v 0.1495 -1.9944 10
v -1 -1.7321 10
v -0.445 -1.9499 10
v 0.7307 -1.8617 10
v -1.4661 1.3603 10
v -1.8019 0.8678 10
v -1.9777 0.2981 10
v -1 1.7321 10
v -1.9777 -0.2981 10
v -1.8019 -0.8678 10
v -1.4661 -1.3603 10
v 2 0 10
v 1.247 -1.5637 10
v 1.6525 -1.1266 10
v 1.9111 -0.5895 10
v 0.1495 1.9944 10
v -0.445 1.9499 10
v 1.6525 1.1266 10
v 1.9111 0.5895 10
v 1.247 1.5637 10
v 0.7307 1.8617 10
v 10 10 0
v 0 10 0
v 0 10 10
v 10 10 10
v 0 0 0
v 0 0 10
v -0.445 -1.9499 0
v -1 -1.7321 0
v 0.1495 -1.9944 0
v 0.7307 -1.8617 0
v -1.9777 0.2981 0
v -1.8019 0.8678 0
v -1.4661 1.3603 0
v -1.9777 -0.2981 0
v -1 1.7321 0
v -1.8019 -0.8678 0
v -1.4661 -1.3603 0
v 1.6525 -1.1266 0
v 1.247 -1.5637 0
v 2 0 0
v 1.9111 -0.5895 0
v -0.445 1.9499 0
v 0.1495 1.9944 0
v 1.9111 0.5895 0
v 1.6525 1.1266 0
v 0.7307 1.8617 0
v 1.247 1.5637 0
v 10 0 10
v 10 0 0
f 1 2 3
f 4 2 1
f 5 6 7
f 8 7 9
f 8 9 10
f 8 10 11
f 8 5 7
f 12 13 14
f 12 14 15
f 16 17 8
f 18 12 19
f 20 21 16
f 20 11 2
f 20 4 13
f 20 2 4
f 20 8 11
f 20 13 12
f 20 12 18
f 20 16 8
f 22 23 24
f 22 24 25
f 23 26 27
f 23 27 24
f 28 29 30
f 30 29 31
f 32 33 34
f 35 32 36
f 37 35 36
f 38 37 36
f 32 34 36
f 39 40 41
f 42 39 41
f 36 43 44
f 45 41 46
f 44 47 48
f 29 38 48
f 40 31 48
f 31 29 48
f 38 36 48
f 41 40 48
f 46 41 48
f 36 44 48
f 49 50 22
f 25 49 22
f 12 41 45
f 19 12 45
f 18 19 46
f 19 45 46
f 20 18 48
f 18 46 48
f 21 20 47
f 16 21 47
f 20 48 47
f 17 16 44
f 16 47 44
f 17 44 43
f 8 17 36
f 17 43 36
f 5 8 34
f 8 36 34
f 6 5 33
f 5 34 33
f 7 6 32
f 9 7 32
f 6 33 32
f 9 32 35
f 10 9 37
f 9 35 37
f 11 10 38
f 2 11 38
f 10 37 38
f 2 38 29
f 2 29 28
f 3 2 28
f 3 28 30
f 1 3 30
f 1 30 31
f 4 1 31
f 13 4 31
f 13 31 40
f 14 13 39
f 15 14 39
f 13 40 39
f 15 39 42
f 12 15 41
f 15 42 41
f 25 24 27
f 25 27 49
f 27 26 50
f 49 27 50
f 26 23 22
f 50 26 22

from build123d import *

# Parameters (mm, degrees)
BOX_W          = 10
BOX_H          = 10
BOX_DEPTH      = 10
CYLINDER_R     = 2
CYLINDER_DEPTH = 10


with BuildPart() as cube:
    # Box → Box (new body)
    with BuildSketch(Plane.XY):
        with Locations((5, 5)):
            Rectangle(BOX_W, BOX_H)
    extrude(amount=BOX_DEPTH)


with BuildPart() as cylinder:
    # Cylinder → Cylinder (new body)
    with BuildSketch(Plane.XY):
        Circle(CYLINDER_R)
    extrude(amount=CYLINDER_DEPTH)


solid = Compound([cube.part, cylinder.part])
